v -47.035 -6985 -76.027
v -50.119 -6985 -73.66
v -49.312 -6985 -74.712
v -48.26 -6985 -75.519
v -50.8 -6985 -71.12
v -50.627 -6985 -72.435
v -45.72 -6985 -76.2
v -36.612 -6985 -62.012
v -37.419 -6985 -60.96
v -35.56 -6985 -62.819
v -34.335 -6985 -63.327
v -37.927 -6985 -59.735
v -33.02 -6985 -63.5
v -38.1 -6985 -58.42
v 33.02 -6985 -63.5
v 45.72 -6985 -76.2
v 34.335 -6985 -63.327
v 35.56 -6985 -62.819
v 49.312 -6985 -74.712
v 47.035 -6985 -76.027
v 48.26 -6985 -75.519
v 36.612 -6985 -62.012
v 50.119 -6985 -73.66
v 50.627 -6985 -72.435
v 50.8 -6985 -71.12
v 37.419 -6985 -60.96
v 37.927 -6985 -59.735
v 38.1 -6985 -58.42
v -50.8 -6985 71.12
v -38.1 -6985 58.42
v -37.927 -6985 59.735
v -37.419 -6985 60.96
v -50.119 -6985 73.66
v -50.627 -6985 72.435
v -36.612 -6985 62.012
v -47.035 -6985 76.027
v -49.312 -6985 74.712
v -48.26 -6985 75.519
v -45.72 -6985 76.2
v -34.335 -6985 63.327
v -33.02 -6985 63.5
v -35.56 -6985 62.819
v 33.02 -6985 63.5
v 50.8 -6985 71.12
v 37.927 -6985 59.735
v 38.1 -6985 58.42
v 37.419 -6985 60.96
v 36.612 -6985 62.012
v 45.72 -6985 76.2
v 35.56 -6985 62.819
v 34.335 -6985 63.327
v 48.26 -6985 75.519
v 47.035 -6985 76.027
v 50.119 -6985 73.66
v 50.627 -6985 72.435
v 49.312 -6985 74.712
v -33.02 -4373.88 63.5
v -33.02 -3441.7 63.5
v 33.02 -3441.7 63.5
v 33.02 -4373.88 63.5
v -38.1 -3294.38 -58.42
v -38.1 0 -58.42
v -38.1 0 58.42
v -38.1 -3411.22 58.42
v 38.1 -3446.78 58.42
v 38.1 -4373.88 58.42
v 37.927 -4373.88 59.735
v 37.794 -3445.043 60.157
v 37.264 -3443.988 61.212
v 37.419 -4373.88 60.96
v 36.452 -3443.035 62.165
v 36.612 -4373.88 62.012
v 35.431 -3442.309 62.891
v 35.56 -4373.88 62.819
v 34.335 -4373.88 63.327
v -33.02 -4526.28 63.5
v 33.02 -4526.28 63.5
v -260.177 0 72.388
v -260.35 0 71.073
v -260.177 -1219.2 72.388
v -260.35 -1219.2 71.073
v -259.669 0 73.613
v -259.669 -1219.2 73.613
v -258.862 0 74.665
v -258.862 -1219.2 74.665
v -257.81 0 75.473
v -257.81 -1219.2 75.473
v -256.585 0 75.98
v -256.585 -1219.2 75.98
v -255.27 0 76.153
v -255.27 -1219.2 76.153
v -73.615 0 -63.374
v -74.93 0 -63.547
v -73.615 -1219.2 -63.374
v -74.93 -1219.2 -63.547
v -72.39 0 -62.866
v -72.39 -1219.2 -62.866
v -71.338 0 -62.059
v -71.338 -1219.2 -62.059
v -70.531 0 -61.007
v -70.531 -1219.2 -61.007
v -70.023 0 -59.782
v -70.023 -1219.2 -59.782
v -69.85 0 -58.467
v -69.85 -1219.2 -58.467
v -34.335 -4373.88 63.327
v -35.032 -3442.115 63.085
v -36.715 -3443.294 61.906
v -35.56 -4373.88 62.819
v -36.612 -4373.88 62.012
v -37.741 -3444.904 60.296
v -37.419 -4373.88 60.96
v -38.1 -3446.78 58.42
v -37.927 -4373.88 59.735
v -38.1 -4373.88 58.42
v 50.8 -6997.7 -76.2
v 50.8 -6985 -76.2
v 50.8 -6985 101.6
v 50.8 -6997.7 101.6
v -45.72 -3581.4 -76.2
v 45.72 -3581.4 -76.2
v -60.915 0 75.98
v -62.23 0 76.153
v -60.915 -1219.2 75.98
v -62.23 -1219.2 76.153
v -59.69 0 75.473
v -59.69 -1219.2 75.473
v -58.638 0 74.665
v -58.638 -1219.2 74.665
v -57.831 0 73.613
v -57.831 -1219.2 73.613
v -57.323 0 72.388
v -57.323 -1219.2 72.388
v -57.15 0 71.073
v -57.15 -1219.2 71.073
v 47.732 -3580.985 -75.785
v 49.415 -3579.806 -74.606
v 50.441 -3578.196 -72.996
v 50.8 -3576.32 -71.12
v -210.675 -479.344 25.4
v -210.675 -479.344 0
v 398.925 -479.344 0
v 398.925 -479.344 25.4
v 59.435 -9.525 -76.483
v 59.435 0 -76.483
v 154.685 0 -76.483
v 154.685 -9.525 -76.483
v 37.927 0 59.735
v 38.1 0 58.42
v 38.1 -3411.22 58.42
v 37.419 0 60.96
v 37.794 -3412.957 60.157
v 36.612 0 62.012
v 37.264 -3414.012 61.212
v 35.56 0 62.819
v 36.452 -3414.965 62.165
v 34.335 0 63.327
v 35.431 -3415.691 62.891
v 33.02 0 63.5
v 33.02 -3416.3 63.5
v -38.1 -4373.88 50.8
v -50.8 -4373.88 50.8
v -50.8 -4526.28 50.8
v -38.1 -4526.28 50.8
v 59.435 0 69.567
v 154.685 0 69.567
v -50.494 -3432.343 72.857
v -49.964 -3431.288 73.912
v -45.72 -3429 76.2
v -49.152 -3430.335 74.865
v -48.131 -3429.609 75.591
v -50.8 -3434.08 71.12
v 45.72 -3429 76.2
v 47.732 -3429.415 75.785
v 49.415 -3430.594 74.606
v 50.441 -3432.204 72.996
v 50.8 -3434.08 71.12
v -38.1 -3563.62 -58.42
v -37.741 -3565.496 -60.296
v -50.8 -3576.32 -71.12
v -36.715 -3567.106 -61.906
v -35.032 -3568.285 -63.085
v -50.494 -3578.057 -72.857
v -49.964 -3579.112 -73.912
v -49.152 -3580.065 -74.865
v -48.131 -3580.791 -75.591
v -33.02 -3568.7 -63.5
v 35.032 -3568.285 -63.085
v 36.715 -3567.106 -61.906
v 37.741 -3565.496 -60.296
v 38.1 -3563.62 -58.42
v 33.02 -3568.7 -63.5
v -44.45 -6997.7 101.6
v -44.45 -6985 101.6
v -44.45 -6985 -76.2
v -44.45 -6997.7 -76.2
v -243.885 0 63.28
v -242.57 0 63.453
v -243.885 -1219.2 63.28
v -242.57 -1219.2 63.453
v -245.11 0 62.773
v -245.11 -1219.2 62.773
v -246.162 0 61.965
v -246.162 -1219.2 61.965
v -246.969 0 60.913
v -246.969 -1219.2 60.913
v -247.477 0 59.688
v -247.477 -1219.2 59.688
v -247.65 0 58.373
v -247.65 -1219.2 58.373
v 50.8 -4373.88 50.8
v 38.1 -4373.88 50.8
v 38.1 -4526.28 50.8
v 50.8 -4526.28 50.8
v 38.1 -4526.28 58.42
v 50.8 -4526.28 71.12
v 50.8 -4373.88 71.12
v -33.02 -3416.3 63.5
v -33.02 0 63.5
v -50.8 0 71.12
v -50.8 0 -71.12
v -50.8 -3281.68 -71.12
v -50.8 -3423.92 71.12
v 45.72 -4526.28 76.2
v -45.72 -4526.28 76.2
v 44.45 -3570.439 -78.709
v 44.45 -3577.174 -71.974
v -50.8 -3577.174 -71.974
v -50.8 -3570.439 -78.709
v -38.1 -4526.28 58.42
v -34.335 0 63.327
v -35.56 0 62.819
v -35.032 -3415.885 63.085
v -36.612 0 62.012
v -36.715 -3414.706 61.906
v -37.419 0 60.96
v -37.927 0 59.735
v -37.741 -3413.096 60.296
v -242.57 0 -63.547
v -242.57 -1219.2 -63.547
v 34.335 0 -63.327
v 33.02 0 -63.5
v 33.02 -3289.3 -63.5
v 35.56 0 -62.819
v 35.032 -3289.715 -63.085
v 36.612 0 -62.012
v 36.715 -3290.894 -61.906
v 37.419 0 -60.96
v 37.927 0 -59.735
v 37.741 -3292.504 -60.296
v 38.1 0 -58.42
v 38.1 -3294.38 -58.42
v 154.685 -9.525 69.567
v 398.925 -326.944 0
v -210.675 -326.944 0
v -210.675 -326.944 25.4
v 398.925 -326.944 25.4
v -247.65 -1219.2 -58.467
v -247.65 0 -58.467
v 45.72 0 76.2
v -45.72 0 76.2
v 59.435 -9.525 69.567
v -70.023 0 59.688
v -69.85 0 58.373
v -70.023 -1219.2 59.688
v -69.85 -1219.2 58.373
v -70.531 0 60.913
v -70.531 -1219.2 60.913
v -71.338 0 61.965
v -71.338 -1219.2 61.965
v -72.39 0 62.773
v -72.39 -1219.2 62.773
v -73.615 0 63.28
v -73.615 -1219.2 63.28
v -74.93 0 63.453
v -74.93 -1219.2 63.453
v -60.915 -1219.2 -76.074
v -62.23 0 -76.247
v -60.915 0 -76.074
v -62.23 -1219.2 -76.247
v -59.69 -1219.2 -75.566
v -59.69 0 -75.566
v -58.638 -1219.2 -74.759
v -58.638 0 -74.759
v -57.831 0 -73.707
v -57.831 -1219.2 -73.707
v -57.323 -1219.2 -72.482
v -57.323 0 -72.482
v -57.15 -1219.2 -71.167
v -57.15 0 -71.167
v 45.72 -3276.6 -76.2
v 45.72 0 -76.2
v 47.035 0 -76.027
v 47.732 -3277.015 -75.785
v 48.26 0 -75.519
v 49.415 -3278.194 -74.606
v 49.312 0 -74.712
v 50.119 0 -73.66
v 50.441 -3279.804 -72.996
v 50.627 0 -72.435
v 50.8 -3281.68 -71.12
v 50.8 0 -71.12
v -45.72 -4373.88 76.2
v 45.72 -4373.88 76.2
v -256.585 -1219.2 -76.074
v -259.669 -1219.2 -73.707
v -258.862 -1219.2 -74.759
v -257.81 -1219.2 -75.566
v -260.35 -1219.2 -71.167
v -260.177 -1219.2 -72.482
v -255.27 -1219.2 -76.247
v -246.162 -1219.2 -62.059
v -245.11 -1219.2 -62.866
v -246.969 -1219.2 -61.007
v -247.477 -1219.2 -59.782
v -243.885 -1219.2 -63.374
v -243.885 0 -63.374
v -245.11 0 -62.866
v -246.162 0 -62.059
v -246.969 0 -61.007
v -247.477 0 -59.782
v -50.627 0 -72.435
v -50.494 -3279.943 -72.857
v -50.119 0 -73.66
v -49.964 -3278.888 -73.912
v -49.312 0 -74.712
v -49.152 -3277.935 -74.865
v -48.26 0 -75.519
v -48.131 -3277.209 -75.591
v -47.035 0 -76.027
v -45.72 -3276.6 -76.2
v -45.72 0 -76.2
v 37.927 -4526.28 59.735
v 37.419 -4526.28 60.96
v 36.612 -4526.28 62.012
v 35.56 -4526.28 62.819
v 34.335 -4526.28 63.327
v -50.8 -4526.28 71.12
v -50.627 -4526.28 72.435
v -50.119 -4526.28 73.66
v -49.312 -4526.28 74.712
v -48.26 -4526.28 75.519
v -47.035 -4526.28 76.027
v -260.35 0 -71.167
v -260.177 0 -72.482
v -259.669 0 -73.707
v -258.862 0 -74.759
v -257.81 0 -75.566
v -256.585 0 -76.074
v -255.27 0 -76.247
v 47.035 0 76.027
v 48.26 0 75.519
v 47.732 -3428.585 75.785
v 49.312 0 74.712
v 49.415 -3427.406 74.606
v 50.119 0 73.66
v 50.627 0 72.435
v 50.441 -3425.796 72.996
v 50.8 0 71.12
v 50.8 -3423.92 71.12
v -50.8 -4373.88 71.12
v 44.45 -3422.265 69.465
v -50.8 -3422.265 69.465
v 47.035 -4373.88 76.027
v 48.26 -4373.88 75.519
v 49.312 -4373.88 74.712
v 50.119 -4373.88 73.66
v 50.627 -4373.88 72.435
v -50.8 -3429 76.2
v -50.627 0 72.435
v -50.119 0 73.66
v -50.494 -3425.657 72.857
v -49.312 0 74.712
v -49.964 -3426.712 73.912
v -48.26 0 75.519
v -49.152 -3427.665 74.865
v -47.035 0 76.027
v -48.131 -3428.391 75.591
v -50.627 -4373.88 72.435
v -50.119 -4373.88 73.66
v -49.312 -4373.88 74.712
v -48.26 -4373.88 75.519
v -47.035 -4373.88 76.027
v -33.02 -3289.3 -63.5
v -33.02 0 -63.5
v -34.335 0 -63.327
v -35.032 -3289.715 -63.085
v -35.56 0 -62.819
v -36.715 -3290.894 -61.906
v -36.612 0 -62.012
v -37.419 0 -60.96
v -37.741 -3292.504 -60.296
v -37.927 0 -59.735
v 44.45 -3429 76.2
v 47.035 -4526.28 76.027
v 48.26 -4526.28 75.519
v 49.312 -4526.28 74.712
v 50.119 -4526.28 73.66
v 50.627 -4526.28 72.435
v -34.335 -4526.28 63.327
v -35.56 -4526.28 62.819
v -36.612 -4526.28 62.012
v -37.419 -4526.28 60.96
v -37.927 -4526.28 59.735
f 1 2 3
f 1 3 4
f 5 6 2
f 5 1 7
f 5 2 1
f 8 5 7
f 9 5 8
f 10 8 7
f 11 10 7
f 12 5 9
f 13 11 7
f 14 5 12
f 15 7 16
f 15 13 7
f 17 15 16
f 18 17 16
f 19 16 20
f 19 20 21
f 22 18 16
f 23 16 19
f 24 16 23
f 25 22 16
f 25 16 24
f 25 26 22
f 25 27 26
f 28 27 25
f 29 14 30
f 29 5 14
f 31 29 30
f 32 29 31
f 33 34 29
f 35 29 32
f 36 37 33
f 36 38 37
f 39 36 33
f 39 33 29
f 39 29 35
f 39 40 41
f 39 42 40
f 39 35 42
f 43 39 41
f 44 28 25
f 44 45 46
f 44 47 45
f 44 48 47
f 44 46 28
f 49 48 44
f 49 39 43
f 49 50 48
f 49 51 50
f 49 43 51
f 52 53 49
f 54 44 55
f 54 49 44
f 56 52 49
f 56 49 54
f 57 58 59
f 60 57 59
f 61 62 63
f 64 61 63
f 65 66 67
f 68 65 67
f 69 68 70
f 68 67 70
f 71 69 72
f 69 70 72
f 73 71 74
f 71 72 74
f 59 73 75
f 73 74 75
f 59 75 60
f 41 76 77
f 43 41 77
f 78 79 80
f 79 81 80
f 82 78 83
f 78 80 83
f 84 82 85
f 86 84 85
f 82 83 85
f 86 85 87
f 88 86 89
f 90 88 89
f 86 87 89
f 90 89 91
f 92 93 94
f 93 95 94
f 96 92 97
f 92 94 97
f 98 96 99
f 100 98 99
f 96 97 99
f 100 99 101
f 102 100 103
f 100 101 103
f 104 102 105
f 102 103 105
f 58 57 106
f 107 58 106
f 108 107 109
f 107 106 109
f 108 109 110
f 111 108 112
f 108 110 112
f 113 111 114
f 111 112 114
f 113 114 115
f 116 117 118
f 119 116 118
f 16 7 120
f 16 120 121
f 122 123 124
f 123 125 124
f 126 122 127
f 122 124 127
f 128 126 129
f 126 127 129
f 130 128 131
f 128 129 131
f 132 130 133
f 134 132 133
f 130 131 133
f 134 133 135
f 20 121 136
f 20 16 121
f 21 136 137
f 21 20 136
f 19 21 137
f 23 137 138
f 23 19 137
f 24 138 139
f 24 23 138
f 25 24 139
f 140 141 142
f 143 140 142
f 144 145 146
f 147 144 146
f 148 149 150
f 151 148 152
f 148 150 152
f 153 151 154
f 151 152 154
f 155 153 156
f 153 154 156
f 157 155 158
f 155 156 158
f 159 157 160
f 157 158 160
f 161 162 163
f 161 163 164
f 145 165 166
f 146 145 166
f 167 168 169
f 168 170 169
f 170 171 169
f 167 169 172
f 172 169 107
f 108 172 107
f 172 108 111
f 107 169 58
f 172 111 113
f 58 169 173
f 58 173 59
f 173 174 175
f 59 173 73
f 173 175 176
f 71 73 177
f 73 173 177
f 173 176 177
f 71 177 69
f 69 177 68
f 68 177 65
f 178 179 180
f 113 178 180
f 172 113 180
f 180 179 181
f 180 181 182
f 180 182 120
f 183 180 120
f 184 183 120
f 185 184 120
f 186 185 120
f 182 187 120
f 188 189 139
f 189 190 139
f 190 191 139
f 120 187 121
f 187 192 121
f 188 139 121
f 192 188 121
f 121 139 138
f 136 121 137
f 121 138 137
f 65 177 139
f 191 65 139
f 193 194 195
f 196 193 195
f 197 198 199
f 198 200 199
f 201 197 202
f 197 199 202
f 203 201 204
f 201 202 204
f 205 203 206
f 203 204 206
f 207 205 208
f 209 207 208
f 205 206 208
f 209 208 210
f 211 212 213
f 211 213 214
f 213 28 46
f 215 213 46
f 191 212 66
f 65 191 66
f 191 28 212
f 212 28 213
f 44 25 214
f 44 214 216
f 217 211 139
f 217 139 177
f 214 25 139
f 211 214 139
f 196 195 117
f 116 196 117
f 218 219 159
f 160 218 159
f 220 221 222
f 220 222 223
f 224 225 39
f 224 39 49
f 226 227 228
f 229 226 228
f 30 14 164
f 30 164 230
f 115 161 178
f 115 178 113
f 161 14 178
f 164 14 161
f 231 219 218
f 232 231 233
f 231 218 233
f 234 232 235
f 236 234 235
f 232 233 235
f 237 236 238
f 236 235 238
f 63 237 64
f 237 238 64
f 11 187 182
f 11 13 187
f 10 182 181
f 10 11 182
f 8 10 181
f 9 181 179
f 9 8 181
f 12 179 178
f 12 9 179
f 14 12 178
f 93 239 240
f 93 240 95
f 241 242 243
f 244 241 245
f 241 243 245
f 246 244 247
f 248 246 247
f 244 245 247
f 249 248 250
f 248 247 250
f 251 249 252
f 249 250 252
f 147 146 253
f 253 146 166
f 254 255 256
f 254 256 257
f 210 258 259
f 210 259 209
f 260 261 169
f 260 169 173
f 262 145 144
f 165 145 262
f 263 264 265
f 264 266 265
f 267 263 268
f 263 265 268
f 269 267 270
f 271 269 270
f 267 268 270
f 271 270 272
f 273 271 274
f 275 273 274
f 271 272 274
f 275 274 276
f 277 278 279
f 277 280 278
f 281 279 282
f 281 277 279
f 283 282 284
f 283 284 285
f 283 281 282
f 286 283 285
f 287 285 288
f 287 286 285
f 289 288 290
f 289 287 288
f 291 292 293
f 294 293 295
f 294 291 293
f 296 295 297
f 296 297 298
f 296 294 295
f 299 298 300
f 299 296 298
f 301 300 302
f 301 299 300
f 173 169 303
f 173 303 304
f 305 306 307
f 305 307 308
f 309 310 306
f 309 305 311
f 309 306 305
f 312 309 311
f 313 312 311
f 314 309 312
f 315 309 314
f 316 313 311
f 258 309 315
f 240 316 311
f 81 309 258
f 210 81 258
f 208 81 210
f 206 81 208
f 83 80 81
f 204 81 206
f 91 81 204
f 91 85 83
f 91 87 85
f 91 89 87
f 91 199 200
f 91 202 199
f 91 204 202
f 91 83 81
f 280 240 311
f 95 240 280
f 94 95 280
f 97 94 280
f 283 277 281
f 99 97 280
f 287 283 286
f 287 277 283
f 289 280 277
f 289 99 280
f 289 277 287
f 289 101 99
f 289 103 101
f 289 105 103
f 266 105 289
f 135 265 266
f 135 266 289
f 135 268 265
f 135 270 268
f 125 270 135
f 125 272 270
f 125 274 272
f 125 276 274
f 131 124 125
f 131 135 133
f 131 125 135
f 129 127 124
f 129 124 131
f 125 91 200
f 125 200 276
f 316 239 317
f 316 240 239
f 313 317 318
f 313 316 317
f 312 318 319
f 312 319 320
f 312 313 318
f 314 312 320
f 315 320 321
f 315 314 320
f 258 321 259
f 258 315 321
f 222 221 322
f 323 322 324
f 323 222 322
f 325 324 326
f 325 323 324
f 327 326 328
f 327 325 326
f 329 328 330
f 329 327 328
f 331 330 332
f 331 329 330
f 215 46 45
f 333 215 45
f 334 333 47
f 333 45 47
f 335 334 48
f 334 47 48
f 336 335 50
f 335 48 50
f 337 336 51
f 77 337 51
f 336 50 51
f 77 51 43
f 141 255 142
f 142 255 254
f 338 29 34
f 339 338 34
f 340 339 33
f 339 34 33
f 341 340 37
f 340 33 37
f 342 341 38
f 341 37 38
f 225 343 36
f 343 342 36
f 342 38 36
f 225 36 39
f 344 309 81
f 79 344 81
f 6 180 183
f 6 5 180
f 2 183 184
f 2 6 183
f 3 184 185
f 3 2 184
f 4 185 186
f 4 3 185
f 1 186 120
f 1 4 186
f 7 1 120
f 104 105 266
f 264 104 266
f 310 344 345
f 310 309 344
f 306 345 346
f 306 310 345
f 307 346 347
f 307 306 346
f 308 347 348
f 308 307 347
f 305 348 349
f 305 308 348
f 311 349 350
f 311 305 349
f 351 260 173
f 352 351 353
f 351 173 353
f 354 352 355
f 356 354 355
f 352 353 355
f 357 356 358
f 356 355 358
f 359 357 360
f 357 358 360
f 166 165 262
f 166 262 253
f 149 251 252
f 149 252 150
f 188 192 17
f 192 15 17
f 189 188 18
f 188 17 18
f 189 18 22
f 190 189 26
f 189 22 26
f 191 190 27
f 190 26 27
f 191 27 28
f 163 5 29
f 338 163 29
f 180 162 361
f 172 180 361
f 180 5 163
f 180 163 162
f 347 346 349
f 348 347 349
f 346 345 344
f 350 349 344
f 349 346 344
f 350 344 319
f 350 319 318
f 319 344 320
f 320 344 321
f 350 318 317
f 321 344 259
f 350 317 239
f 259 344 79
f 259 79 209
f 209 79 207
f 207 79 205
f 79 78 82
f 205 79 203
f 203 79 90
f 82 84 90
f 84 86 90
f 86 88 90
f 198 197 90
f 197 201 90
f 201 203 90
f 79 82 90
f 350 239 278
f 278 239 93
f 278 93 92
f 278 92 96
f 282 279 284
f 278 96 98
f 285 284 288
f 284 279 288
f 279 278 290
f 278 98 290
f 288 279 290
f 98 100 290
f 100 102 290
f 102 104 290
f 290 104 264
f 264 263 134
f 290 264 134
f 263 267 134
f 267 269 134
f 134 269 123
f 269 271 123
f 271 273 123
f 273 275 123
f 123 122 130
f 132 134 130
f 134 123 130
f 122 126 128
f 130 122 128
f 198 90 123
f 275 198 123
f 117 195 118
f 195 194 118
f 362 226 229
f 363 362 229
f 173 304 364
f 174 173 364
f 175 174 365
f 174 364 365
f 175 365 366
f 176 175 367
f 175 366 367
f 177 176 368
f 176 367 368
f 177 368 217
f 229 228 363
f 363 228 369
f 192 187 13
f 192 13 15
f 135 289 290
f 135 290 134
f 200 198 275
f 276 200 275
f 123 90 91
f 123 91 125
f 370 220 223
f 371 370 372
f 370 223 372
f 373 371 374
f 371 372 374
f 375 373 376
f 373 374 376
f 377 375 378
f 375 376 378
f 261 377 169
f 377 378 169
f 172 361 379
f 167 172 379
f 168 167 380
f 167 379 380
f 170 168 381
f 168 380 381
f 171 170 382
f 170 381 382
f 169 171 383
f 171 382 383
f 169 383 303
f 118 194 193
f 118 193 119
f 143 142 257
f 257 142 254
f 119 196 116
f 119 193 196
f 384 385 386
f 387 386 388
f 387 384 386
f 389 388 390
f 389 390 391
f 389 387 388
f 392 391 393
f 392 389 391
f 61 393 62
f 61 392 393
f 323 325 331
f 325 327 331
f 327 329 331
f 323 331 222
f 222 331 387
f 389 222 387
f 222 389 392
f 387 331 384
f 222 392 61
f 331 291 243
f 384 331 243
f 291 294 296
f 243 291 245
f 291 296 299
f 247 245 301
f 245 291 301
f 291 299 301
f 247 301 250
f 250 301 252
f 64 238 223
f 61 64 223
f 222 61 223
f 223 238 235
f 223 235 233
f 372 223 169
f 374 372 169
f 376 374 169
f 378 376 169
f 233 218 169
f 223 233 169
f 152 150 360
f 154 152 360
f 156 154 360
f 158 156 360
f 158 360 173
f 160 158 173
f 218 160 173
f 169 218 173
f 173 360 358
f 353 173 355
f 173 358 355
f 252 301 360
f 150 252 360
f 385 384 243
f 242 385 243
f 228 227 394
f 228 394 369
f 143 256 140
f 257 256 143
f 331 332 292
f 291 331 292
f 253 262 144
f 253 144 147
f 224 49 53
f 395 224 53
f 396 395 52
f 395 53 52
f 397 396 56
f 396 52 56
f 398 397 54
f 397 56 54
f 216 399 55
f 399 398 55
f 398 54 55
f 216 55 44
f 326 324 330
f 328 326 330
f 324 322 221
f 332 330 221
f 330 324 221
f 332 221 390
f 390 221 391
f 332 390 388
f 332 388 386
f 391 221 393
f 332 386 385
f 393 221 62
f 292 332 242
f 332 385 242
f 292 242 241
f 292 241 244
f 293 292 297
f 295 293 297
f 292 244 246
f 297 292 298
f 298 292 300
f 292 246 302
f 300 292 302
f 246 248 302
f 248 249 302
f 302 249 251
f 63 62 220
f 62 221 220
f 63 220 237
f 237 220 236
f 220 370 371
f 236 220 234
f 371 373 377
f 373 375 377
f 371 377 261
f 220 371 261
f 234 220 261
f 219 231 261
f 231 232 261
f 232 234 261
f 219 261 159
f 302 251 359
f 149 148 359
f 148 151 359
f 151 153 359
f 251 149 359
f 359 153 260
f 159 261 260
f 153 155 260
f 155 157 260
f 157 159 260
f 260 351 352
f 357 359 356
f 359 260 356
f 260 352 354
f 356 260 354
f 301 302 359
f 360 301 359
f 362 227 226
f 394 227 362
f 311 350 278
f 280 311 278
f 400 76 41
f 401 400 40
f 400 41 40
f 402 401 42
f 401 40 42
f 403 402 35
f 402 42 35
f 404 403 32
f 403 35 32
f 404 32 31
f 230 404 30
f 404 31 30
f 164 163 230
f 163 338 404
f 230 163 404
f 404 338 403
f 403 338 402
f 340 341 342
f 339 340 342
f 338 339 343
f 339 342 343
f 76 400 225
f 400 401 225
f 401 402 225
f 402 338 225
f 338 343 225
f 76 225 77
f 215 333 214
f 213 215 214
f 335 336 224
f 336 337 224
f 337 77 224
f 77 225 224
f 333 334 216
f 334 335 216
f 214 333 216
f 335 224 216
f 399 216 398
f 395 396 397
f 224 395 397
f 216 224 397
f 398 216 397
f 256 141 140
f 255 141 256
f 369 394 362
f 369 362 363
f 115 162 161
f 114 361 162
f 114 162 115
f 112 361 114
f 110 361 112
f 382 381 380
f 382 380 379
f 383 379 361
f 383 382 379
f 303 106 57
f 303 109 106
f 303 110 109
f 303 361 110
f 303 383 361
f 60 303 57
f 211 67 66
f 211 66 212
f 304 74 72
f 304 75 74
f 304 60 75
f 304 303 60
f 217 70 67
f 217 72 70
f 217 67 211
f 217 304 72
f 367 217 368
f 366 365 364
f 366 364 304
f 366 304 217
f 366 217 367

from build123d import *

# Parameters (mm, degrees)
F1_W      = 203.2
F1_H      = 152.4
F1_W_2    = 177.8
F1_H_2    = 127
F3_DEPTH  = 1219.2
F0_W      = 101.6
F0_H      = 152.4
F0_W_2    = 76.2
F0_H_2    = 127
F4_DEPTH  = 3429
F2_W      = 95.25
F2_H      = 146.05
F5_DEPTH  = 9.525
F6_DEPTH  = 3556
F9_DEPTH  = 311.151
F10_DEPTH = 311.151
F11_W     = 95.25
F11_H     = 209.55
F11_W_2   = 76.2
F11_H_2   = 179.6051224214
F12_DEPTH = 9.525
F13_W     = 95.25
F13_H     = 152.4
F13_W_2   = 76.2
F13_H_2   = 127
F13_H_3   = 25.4
F14_DEPTH = 12.7
F15_R     = 5.08
F15_2_R   = 5.08
F15_3_R   = 5.08
F16_W     = 609.6
F16_H     = 152.4
F17_DEPTH = 25.4
F18_W     = 246.9795793295
F18_H     = 152.4
F19_DEPTH = 25.4


with BuildPart() as f3:
    # F1 (on Front) → F3 (new body)
    with BuildSketch(Plane.XZ):
        with Locations((-158.75, -0.0468501925)):
            Rectangle(F1_W, F1_H)
        with Locations((-158.75, -0.0468501925)):
            Rectangle(F1_W_2, F1_H_2, mode=Mode.SUBTRACT)
    extrude(amount=F3_DEPTH)

    # F15#3
    f15_3_edges = [f3.edges().sort_by_distance(p)[0] for p in [
        (-69.85, -609.6, 63.45315),
        (-69.85, -609.6, -63.54685),
        (-247.65, -609.6, -63.54685),
        (-247.65, -609.6, 63.45315),
        (-57.15, -609.6, -76.24685),
        (-260.35, -609.6, -76.24685),
        (-260.35, -609.6, 76.15315),
        (-57.15, -609.6, 76.15315),
    ]]
    fillet(f15_3_edges, radius=F15_3_R)


with BuildPart() as f4:
    # F0 (on Front) → F4 (new body)
    with BuildSketch(Plane.XZ):
        Rectangle(F0_W, F0_H)
        Rectangle(F0_W_2, F0_H_2, mode=Mode.SUBTRACT)
    extrude(amount=F4_DEPTH)


with BuildPart() as f5:
    # F2 (on Front) → F5 (new body)
    with BuildSketch(Plane.XZ):
        with Locations((107.0601179898, -3.458078301)):
            Rectangle(F2_W, F2_H)
    extrude(amount=F5_DEPTH)


with BuildPart() as f6:
    # F6 (new): a face of the model
    f6_faces = [f4.part.faces().sort_by_distance(p)[0] for p in [
        (0, -3429, -74.3683799521),
    ]]
    extrude(f6_faces, amount=F6_DEPTH)

    # F7 (on face) → F10 (cut, through all)
    with BuildSketch(Plane.YZ.offset(50.8)):
        Polygon((-3429, -76.2), (-3429, 76.2), (-3581.4, -76.2), align=None)
    extrude(amount=-F10_DEPTH, mode=Mode.SUBTRACT)

    # F15#2
    f15_2_edges = [f6.edges().sort_by_distance(p)[0] for p in [
        (50.8, -5283.2, -76.2),
        (-50.8, -5283.2, -76.2),
        (50.8, -5207, 76.2),
        (-50.8, -5207, 76.2),
        (-38.1, -5213.35, 63.5),
        (38.1, -5213.35, 63.5),
        (38.1, -5276.85, -63.5),
        (-38.1, -5276.85, -63.5),
    ]]
    fillet(f15_2_edges, radius=F15_2_R)

    # F18 (on face) → F19 (cut)
    with BuildSketch(Plane.XY.offset(76.2)):
        with Locations((-5.5087581277, -4450.08)):
            Rectangle(F18_W, F18_H)
    extrude(amount=-F19_DEPTH, mode=Mode.SUBTRACT)


with BuildPart() as f4_1:
    add(f4.part)

    # F8 (on face) → F9 (cut, through all)
    with BuildSketch(Plane.YZ.offset(50.8)):
        Polygon((-3276.6, -76.2), (-3429, 76.2), (-3429, -76.2), align=None)
    extrude(amount=-F9_DEPTH, mode=Mode.SUBTRACT)

    # F15
    f15_edges = [f4_1.edges().sort_by_distance(p)[0] for p in [
        (-50.8, -1714.5, 76.2),
        (-50.8, -1638.3, -76.2),
        (50.8, -1638.3, -76.2),
        (50.8, -1714.5, 76.2),
        (-38.1, -1708.15, 63.5),
        (38.1, -1708.15, 63.5),
        (38.1, -1644.65, -63.5),
        (-38.1, -1644.65, -63.5),
    ]]
    fillet(f15_edges, radius=F15_R)


with BuildPart() as f12:
    # F11 (on face) → F12 (new body)
    with BuildSketch(Plane(origin=(0, -1752.6, 1752.6), x_dir=(-1, 0, 0), z_dir=(0, 0.7071067812, -0.7071067812))):
        with Locations((3.175, -2475.5626159623)):
            Rectangle(F11_W, F11_H)
        with Locations((0, -2478.5506894151)):
            Rectangle(F11_W_2, F11_H_2, mode=Mode.SUBTRACT)
        with Locations((0, -2478.5506894151)):
            Rectangle(F11_W_2, F11_H_2)
    extrude(amount=F12_DEPTH)


with BuildPart() as f14:
    # F13 (on face) → F14 (new body)
    with BuildSketch(Plane.XZ.offset(6985)):
        with Locations((3.175, 0)):
            Rectangle(F13_W, F13_H)
        Rectangle(F13_W_2, F13_H_2, mode=Mode.SUBTRACT)
        Rectangle(F13_W_2, F13_H_2)
        with Locations((3.175, 88.9)):
            Rectangle(F13_W, F13_H_3)
    extrude(amount=F14_DEPTH)


with BuildPart() as f17:
    # F16 (on Top) → F17 (new body)
    with BuildSketch(Plane.XY):
        with Locations((94.1249171257, -403.1442487717)):
            Rectangle(F16_W, F16_H)
    extrude(amount=F17_DEPTH)


solid = Compound([f3.part, f5.part, f6.part, f4_1.part, f12.part, f14.part, f17.part])
